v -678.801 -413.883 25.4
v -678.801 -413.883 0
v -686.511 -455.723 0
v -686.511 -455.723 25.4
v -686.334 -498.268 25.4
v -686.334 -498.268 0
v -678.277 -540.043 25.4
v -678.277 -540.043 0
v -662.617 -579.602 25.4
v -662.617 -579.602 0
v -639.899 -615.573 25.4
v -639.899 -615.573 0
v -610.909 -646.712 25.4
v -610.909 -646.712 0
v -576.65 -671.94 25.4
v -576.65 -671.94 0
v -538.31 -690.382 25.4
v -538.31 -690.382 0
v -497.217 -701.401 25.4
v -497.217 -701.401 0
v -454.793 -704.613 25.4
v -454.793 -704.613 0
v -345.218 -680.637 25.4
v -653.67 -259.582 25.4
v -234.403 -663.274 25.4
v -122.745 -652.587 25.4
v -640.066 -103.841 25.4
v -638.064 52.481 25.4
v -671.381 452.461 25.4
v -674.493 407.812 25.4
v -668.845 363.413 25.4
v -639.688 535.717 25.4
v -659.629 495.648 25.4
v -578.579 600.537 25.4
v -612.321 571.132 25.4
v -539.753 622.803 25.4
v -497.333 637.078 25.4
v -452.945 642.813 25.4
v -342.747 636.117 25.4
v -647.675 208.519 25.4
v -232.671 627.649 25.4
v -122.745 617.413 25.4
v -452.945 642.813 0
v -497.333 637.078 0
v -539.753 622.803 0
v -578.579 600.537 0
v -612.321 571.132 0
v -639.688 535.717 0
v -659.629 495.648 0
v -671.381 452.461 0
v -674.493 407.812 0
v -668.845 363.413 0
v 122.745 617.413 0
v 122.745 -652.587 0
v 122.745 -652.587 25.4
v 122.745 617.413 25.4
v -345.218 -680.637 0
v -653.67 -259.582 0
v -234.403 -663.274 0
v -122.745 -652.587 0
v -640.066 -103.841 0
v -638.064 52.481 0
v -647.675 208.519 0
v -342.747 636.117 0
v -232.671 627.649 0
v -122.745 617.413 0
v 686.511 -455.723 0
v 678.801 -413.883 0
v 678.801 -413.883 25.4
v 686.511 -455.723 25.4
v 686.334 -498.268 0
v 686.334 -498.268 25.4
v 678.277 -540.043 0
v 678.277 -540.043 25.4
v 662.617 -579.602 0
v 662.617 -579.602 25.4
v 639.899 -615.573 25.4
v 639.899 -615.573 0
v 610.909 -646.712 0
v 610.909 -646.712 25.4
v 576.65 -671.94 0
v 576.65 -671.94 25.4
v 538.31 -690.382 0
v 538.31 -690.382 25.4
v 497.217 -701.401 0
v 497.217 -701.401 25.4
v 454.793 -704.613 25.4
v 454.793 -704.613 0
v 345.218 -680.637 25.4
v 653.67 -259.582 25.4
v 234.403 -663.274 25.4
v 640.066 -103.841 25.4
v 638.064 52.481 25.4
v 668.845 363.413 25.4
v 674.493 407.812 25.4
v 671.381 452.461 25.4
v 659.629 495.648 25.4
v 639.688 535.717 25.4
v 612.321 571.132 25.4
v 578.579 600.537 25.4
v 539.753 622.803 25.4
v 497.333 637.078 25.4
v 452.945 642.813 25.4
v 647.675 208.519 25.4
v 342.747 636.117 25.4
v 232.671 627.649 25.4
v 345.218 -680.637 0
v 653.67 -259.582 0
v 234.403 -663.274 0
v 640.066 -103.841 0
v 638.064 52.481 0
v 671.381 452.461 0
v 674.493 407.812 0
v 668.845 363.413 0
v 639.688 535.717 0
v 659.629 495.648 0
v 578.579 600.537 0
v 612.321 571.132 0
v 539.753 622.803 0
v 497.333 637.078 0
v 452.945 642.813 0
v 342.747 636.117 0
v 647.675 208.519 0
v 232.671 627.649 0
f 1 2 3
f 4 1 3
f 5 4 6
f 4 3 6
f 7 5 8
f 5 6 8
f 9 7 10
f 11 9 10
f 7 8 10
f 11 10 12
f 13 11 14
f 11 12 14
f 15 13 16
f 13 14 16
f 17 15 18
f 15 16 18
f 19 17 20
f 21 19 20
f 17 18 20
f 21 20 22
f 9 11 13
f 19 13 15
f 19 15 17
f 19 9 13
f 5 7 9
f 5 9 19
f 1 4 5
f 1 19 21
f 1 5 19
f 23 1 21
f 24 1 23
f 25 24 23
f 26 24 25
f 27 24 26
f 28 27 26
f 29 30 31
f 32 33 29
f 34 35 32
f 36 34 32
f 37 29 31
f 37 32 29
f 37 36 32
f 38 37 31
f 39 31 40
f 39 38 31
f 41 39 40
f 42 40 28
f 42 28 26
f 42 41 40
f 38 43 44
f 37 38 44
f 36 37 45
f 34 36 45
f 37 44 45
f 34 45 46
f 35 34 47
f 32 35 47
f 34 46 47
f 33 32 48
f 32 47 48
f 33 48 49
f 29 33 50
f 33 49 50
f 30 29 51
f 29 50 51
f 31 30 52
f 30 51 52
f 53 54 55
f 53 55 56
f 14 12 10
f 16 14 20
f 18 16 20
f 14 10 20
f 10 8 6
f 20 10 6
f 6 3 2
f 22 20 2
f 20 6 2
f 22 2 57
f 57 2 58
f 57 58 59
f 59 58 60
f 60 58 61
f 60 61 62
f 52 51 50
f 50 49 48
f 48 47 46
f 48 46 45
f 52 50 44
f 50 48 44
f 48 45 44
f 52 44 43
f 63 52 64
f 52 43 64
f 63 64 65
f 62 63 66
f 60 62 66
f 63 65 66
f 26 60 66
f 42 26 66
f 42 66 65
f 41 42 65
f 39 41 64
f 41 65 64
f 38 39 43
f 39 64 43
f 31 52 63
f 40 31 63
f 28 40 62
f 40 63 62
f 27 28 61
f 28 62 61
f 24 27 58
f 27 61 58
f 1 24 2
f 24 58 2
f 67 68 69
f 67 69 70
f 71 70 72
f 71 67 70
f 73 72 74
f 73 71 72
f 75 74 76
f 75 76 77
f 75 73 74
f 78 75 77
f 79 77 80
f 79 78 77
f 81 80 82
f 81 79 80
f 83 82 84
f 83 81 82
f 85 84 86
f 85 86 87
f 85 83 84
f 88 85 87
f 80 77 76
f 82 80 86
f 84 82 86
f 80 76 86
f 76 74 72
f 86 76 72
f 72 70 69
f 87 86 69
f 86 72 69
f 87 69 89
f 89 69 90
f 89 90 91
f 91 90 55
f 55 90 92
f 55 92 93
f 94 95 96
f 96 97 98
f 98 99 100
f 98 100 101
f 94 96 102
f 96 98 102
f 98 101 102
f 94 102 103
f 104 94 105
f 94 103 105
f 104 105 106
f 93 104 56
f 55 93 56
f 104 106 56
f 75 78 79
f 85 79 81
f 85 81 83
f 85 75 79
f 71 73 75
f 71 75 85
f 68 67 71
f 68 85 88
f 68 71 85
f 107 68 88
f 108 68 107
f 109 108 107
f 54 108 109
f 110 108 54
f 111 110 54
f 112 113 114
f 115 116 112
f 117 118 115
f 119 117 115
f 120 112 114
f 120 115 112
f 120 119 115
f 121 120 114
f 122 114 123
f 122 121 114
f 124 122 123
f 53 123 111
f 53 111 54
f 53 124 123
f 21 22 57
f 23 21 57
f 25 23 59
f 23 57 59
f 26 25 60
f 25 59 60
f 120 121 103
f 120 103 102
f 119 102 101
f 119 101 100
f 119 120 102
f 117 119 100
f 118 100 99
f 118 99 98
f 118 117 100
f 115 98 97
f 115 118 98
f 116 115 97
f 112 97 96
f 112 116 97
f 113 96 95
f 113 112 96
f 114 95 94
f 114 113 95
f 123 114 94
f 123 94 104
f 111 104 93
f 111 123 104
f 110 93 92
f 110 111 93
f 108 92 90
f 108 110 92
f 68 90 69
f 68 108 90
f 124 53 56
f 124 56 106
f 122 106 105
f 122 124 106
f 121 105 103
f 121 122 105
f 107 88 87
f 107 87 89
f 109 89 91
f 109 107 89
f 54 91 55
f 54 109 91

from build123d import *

# Parameters (mm, degrees)
F1_DEPTH = 25.4


# Not quite as in the source:
# - a feature names something its author has since deleted; it is built from what else it names


with BuildPart() as f1:
    # F0 (on Top) → F1 (new body)
    with BuildSketch(Plane.XY):
        with BuildLine():
            Line((-122.74547472, 363.4131123645), (-122.74547472, 617.4131123645))
            ThreePointArc((-122.74547472, 617.4131123645), (-287.6923004816, 632.1043774637), (-452.94547472, 642.8131123645))
            ThreePointArc((-452.94547472, 642.8131123645), (-626.8733109875, 554.0959858439), (-668.84547472, 363.4131123645))
            ThreePointArc((-668.84547472, 363.4131123645), (-637.6124772586, -25.6986468555), (-678.8013792429, -413.8827985761))
            ThreePointArc((-678.8013792429, -413.8827985761), (-639.8991633536, -615.573241104), (-454.793114458, -704.61349981))
            ThreePointArc((-454.793114458, -704.61349981), (-289.9406925994, -671.1240208892), (-122.74547472, -652.5868876355))
            Line((-122.74547472, -652.5868876355), (-122.74547472, 363.4131123645))
        make_face()
    extrude(amount=F1_DEPTH)


with BuildPart() as f2_1:
    # F2: instance of F1
    add(f1.part.mirror(Plane.YZ))


solid = Compound([f1.part, f2_1.part])
